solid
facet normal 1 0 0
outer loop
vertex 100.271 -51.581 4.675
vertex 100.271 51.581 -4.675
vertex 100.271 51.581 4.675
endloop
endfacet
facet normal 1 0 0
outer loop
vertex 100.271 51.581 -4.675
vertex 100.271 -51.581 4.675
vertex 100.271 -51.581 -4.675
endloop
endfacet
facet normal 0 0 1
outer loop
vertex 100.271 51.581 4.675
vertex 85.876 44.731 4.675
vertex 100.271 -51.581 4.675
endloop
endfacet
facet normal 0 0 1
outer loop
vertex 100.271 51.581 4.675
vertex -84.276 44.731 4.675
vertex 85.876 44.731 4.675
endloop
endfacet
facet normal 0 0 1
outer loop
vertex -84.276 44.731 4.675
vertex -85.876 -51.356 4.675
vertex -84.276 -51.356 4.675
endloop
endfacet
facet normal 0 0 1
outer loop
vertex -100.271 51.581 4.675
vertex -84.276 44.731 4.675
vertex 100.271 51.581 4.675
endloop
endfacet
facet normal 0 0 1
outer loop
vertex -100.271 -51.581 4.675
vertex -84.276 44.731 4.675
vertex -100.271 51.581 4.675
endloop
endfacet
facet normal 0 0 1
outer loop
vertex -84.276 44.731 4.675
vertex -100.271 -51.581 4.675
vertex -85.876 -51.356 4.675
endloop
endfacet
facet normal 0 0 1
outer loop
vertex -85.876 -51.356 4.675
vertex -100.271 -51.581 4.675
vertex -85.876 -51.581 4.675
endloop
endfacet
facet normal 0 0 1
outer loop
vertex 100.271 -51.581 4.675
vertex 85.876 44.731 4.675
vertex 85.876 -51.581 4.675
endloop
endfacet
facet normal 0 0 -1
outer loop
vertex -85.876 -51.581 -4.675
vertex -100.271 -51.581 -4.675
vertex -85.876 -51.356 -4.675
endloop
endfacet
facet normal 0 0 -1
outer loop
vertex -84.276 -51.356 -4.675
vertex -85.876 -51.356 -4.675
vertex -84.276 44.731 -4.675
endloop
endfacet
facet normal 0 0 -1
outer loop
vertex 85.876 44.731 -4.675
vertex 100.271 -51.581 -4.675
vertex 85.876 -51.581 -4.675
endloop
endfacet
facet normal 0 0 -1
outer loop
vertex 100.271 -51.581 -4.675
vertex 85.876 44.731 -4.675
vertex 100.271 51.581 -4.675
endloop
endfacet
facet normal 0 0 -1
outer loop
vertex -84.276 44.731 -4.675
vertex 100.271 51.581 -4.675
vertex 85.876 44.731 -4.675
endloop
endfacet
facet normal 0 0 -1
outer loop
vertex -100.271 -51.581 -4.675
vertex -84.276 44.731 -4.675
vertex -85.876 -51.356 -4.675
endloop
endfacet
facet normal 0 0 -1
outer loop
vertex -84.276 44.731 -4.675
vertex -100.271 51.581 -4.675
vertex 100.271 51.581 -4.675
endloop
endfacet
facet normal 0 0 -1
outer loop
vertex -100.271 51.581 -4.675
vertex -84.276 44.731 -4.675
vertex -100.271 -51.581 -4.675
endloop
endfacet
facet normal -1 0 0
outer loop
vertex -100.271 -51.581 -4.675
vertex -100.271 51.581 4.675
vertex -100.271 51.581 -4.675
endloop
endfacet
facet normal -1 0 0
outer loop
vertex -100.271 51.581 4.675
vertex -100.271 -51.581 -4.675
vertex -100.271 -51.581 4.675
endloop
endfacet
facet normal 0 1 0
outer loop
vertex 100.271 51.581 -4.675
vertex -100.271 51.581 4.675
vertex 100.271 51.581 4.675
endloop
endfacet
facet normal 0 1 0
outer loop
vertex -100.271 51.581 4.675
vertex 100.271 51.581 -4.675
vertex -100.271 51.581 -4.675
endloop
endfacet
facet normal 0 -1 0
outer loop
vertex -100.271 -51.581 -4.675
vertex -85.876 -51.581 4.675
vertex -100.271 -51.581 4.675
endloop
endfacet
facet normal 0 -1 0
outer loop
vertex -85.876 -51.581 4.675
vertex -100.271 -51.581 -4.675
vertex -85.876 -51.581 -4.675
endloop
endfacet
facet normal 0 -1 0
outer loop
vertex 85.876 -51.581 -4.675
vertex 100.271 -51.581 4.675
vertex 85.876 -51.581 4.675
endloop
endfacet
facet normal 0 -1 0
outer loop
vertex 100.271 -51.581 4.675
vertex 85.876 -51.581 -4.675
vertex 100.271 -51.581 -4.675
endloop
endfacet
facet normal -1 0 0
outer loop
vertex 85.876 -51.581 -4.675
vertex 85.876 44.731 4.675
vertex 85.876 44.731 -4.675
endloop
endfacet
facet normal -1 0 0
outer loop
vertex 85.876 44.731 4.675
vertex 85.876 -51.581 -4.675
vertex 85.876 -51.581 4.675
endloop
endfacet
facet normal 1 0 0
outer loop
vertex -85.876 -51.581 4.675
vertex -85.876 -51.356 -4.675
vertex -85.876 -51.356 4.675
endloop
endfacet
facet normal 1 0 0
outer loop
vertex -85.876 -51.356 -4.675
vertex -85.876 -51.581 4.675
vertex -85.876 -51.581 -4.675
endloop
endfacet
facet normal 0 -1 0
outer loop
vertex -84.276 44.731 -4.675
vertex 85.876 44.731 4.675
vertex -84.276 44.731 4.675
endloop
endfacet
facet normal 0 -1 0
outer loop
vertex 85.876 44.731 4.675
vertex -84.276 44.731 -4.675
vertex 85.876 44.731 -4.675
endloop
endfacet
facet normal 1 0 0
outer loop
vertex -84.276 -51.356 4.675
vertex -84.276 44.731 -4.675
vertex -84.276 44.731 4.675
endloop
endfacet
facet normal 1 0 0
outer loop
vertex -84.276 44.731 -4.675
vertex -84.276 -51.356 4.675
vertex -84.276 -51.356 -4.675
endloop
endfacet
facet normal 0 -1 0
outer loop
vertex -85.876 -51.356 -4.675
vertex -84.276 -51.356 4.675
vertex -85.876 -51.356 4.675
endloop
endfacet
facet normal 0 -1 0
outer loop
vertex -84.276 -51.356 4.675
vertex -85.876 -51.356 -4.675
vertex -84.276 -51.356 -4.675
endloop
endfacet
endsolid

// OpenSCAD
width=198.043+2.5;
length=103.163;
height=6.3501+3;
top=6.3501+0.5;
left_offset=3.2;//3.186;
l_w=14.395;

union(){
difference(){


difference(){
cube([width,length,height],center=true);
cube([width-(2*l_w),length-(2*top),height],center=true);}

translate([0,-l_w,0])
cube([width-(2*l_w),length-(2*top),height],center=true);
}
translate([-(width-(2*l_w))/2.0,-left_offset,0])
cube([left_offset,length-(top),height],center=true);
}
